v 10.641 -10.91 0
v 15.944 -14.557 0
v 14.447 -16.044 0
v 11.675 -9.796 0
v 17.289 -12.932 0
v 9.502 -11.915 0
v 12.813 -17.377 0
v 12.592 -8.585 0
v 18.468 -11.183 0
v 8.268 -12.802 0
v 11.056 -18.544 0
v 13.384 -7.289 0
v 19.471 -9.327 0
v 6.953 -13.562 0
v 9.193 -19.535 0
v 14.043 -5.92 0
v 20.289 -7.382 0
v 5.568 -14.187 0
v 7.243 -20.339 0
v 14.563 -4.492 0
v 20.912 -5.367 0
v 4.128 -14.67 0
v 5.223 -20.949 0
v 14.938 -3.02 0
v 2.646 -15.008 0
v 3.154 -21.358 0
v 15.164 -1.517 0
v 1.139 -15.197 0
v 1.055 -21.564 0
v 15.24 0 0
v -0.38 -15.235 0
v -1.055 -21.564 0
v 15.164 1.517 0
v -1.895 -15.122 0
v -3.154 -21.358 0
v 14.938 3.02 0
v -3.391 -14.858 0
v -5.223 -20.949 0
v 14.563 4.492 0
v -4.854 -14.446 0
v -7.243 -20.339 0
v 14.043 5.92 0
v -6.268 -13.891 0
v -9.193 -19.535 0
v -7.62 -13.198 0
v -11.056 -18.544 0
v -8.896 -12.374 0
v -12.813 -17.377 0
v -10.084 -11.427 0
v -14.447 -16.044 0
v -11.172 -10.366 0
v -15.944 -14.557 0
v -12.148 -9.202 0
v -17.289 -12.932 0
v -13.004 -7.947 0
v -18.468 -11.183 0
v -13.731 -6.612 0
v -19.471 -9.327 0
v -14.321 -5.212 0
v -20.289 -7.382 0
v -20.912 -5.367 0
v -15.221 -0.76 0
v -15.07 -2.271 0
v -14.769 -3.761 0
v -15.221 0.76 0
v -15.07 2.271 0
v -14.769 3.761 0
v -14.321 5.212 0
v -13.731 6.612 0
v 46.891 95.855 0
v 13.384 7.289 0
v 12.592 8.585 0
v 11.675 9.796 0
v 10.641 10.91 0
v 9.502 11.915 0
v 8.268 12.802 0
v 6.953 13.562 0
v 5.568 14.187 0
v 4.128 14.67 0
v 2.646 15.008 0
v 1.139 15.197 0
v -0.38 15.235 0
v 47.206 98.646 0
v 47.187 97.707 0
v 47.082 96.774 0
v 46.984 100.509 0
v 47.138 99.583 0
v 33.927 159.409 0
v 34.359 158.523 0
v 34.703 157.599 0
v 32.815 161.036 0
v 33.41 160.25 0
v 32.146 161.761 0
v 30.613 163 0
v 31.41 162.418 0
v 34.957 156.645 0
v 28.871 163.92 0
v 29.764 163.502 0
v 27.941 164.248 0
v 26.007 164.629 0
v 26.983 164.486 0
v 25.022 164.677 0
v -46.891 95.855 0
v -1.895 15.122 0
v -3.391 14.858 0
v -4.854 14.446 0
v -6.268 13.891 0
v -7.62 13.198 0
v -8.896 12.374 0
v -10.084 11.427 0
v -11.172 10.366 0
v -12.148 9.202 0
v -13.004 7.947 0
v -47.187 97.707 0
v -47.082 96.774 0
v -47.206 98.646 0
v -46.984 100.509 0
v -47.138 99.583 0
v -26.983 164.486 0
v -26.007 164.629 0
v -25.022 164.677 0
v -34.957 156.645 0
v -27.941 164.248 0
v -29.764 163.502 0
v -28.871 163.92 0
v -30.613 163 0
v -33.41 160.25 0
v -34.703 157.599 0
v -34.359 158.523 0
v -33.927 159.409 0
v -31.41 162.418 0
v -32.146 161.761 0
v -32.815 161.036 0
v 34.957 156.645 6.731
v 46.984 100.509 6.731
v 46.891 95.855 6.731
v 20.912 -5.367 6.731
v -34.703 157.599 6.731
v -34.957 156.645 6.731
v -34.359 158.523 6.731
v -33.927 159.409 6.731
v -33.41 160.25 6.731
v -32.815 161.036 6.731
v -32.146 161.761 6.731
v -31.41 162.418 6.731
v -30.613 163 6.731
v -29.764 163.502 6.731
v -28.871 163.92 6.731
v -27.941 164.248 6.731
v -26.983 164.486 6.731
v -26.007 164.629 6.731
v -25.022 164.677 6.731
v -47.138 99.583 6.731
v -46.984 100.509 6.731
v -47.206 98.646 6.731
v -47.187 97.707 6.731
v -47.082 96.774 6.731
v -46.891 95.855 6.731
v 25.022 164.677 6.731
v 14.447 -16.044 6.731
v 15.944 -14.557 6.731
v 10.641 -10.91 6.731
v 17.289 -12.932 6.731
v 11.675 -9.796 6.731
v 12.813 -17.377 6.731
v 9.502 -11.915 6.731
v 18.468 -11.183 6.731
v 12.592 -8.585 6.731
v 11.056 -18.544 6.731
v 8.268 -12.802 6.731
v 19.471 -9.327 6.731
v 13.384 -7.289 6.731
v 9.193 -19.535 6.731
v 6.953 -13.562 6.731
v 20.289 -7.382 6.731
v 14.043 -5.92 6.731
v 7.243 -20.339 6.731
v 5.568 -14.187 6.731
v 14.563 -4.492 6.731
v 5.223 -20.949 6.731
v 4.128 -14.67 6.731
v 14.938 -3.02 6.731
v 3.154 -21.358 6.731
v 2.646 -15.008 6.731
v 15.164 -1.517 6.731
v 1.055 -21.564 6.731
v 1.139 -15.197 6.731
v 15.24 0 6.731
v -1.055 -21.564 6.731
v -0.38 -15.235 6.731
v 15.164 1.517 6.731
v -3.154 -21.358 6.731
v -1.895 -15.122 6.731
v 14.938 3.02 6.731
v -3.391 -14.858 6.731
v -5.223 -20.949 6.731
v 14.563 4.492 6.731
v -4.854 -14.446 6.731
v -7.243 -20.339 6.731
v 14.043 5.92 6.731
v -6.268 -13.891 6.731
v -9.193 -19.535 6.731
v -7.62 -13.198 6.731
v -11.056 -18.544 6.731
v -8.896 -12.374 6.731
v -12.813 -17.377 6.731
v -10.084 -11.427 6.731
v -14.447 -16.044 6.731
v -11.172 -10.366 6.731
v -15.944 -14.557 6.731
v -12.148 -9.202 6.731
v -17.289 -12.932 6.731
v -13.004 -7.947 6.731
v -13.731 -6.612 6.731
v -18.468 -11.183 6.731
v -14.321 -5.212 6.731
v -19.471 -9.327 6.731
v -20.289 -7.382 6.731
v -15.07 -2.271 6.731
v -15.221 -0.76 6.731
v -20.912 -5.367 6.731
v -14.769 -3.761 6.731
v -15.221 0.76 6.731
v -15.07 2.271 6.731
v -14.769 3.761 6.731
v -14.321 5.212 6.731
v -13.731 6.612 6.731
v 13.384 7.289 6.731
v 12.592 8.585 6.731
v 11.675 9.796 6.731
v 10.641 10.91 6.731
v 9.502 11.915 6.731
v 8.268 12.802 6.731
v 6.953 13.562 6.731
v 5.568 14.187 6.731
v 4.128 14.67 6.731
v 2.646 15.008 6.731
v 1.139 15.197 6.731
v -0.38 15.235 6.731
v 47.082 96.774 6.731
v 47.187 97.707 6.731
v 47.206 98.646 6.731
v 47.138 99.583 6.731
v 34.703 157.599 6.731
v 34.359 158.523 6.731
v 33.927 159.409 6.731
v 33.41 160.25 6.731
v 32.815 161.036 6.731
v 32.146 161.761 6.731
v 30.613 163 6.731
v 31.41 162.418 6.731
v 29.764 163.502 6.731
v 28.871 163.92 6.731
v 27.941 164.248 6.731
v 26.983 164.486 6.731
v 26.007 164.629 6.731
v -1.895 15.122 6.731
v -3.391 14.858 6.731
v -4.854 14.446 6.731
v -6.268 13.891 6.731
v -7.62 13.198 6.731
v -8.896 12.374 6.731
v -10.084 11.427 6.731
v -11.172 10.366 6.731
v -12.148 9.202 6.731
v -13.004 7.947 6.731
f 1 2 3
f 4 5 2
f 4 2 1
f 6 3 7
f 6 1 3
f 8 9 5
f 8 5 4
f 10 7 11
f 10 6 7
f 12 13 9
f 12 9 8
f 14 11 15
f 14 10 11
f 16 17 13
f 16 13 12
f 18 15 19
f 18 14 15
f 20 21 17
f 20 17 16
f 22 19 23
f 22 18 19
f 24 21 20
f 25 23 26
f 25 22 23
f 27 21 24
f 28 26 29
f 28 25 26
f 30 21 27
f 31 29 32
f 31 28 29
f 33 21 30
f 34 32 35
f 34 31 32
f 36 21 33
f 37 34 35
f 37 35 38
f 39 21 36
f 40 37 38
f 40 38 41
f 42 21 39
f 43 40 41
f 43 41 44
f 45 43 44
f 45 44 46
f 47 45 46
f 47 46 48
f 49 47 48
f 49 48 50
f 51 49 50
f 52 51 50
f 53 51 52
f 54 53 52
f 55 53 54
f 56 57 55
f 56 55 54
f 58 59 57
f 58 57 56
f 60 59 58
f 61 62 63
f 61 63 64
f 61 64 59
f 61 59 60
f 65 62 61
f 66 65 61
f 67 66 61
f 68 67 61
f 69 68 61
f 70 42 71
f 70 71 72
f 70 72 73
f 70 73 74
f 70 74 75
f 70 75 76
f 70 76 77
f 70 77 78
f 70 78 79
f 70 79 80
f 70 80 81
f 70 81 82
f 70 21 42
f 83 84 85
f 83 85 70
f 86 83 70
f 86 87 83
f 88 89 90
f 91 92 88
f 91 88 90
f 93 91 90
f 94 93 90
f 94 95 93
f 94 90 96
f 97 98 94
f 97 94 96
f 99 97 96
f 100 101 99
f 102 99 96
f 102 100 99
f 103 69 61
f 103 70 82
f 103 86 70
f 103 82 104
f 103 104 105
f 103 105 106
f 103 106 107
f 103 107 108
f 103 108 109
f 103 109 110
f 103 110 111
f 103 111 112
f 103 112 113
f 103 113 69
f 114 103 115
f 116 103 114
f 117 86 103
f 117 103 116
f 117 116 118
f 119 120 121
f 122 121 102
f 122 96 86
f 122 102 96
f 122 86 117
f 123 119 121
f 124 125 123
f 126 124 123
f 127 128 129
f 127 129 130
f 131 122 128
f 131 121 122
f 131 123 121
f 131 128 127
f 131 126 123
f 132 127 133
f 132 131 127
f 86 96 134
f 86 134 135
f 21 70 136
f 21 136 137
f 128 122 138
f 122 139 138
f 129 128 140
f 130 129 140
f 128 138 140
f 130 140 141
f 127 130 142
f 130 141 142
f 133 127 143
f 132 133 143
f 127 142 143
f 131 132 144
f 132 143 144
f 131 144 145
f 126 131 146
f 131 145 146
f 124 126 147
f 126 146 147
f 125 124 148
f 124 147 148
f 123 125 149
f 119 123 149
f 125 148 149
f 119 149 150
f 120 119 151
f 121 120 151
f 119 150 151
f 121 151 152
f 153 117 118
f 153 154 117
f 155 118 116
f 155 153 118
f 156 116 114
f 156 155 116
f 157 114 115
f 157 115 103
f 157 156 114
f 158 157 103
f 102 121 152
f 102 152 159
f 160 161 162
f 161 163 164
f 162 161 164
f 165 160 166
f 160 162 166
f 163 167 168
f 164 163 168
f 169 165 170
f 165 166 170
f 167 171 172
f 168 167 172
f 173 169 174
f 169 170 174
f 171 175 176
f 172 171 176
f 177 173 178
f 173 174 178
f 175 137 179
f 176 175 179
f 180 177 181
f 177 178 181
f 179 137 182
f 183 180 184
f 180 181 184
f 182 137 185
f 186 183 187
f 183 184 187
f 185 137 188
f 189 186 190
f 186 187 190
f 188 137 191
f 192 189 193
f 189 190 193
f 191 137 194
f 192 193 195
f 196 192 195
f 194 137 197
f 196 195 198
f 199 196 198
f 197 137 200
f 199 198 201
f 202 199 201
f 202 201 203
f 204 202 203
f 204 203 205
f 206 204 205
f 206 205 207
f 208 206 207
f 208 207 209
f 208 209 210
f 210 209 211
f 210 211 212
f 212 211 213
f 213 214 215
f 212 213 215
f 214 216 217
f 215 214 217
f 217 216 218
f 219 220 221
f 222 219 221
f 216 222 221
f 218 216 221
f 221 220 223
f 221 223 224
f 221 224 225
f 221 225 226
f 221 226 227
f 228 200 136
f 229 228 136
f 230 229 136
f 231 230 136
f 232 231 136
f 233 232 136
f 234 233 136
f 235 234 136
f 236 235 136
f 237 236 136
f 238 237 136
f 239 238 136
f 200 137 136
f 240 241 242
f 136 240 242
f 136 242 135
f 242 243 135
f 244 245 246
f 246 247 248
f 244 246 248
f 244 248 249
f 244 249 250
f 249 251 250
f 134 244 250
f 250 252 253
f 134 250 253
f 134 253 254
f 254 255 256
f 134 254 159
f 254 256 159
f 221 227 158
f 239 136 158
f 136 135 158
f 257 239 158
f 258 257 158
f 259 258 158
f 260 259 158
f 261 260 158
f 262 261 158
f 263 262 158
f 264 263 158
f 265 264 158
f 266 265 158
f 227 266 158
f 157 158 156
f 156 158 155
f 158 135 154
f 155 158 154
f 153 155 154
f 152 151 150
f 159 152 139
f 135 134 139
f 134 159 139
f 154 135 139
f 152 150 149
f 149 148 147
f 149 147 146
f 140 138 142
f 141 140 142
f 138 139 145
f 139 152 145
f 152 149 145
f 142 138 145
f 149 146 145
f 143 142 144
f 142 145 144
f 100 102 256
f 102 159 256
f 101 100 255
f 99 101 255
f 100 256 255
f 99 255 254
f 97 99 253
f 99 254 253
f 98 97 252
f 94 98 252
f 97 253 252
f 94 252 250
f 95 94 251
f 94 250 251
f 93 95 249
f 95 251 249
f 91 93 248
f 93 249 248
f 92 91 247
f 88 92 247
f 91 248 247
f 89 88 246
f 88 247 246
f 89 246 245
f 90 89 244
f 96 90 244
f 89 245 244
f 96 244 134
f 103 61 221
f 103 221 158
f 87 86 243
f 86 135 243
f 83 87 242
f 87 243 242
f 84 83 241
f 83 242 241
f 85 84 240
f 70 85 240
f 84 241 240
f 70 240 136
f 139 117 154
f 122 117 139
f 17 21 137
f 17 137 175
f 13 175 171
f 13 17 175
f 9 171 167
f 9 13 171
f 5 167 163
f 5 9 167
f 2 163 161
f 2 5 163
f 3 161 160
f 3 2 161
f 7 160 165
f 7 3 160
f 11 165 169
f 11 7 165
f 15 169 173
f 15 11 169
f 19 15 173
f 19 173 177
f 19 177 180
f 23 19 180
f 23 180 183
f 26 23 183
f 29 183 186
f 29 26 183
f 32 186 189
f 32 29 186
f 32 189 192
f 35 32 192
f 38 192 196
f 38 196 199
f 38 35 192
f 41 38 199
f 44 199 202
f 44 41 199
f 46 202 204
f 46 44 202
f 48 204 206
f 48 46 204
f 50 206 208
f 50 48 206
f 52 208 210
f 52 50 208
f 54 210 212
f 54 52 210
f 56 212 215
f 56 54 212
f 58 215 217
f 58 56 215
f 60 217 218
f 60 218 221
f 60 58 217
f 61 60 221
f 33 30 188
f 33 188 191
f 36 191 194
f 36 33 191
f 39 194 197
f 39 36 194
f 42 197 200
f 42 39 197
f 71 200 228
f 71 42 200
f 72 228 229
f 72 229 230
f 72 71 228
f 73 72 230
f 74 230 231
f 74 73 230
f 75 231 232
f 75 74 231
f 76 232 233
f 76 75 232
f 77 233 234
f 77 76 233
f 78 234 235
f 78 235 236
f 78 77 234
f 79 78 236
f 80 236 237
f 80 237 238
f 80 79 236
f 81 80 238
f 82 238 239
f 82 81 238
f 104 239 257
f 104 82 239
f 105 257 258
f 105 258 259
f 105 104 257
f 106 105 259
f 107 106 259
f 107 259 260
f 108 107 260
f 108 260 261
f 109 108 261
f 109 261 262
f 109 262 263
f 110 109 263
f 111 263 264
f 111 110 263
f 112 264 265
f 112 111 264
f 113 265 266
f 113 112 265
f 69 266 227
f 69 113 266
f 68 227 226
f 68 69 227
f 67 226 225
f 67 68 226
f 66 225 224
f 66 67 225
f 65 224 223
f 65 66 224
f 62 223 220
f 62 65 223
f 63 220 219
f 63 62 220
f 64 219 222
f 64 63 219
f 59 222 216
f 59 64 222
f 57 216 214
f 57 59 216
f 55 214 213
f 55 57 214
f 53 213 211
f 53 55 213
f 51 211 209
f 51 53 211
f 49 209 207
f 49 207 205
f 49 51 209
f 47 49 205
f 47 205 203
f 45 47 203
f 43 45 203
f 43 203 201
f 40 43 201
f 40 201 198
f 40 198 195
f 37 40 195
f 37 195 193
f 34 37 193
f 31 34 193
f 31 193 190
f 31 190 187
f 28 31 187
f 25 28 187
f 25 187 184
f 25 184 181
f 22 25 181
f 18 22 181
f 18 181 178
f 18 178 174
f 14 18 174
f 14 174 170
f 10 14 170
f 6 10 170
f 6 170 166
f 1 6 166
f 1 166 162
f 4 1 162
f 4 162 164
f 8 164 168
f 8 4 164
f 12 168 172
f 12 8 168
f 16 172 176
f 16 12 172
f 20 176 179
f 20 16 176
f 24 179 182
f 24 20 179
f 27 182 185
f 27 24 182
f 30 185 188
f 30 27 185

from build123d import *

# Parameters (mm, degrees)
SKETCH1_R           = 15.24
BOSS_EXTRUDE1_DEPTH = 6.731
FILLET1_R           = 10.16
FILLET2_R           = 10.16


with BuildPart() as part:
    # Sketch1 → Boss-Extrude1 (new body)
    with BuildSketch(Plane.XY):
        with BuildLine():
            Line((-33.2359, 164.676666667), (33.2359, 164.676666667))
            Line((33.2359, 164.676666667), (47.4853, 98.171))
            Line((47.4853, 98.171), (20.912246435, -5.367126704))
            ThreePointArc((20.912246435, -5.367126704), (0, -21.59), (-20.912246435, -5.367126704))
            Line((-20.912246435, -5.367126704), (-47.4853, 98.171))
            Line((-47.4853, 98.171), (-33.2359, 164.676666667))
        make_face()
        Circle(SKETCH1_R, mode=Mode.SUBTRACT)
    extrude(amount=BOSS_EXTRUDE1_DEPTH)

    # Fillet1
    fillet1_edges = [part.edges().sort_by_distance(p)[0] for p in [
        (-47.4853, 98.171, 3.3655),
        (47.4853, 98.171, 3.3655),
    ]]
    fillet(fillet1_edges, radius=FILLET1_R)

    # Fillet2
    fillet2_edges = [part.edges().sort_by_distance(p)[0] for p in [
        (-33.2359, 164.676666667, 3.3655),
        (33.2359, 164.676666667, 3.3655),
    ]]
    fillet(fillet2_edges, radius=FILLET2_R)


solid = part.part
